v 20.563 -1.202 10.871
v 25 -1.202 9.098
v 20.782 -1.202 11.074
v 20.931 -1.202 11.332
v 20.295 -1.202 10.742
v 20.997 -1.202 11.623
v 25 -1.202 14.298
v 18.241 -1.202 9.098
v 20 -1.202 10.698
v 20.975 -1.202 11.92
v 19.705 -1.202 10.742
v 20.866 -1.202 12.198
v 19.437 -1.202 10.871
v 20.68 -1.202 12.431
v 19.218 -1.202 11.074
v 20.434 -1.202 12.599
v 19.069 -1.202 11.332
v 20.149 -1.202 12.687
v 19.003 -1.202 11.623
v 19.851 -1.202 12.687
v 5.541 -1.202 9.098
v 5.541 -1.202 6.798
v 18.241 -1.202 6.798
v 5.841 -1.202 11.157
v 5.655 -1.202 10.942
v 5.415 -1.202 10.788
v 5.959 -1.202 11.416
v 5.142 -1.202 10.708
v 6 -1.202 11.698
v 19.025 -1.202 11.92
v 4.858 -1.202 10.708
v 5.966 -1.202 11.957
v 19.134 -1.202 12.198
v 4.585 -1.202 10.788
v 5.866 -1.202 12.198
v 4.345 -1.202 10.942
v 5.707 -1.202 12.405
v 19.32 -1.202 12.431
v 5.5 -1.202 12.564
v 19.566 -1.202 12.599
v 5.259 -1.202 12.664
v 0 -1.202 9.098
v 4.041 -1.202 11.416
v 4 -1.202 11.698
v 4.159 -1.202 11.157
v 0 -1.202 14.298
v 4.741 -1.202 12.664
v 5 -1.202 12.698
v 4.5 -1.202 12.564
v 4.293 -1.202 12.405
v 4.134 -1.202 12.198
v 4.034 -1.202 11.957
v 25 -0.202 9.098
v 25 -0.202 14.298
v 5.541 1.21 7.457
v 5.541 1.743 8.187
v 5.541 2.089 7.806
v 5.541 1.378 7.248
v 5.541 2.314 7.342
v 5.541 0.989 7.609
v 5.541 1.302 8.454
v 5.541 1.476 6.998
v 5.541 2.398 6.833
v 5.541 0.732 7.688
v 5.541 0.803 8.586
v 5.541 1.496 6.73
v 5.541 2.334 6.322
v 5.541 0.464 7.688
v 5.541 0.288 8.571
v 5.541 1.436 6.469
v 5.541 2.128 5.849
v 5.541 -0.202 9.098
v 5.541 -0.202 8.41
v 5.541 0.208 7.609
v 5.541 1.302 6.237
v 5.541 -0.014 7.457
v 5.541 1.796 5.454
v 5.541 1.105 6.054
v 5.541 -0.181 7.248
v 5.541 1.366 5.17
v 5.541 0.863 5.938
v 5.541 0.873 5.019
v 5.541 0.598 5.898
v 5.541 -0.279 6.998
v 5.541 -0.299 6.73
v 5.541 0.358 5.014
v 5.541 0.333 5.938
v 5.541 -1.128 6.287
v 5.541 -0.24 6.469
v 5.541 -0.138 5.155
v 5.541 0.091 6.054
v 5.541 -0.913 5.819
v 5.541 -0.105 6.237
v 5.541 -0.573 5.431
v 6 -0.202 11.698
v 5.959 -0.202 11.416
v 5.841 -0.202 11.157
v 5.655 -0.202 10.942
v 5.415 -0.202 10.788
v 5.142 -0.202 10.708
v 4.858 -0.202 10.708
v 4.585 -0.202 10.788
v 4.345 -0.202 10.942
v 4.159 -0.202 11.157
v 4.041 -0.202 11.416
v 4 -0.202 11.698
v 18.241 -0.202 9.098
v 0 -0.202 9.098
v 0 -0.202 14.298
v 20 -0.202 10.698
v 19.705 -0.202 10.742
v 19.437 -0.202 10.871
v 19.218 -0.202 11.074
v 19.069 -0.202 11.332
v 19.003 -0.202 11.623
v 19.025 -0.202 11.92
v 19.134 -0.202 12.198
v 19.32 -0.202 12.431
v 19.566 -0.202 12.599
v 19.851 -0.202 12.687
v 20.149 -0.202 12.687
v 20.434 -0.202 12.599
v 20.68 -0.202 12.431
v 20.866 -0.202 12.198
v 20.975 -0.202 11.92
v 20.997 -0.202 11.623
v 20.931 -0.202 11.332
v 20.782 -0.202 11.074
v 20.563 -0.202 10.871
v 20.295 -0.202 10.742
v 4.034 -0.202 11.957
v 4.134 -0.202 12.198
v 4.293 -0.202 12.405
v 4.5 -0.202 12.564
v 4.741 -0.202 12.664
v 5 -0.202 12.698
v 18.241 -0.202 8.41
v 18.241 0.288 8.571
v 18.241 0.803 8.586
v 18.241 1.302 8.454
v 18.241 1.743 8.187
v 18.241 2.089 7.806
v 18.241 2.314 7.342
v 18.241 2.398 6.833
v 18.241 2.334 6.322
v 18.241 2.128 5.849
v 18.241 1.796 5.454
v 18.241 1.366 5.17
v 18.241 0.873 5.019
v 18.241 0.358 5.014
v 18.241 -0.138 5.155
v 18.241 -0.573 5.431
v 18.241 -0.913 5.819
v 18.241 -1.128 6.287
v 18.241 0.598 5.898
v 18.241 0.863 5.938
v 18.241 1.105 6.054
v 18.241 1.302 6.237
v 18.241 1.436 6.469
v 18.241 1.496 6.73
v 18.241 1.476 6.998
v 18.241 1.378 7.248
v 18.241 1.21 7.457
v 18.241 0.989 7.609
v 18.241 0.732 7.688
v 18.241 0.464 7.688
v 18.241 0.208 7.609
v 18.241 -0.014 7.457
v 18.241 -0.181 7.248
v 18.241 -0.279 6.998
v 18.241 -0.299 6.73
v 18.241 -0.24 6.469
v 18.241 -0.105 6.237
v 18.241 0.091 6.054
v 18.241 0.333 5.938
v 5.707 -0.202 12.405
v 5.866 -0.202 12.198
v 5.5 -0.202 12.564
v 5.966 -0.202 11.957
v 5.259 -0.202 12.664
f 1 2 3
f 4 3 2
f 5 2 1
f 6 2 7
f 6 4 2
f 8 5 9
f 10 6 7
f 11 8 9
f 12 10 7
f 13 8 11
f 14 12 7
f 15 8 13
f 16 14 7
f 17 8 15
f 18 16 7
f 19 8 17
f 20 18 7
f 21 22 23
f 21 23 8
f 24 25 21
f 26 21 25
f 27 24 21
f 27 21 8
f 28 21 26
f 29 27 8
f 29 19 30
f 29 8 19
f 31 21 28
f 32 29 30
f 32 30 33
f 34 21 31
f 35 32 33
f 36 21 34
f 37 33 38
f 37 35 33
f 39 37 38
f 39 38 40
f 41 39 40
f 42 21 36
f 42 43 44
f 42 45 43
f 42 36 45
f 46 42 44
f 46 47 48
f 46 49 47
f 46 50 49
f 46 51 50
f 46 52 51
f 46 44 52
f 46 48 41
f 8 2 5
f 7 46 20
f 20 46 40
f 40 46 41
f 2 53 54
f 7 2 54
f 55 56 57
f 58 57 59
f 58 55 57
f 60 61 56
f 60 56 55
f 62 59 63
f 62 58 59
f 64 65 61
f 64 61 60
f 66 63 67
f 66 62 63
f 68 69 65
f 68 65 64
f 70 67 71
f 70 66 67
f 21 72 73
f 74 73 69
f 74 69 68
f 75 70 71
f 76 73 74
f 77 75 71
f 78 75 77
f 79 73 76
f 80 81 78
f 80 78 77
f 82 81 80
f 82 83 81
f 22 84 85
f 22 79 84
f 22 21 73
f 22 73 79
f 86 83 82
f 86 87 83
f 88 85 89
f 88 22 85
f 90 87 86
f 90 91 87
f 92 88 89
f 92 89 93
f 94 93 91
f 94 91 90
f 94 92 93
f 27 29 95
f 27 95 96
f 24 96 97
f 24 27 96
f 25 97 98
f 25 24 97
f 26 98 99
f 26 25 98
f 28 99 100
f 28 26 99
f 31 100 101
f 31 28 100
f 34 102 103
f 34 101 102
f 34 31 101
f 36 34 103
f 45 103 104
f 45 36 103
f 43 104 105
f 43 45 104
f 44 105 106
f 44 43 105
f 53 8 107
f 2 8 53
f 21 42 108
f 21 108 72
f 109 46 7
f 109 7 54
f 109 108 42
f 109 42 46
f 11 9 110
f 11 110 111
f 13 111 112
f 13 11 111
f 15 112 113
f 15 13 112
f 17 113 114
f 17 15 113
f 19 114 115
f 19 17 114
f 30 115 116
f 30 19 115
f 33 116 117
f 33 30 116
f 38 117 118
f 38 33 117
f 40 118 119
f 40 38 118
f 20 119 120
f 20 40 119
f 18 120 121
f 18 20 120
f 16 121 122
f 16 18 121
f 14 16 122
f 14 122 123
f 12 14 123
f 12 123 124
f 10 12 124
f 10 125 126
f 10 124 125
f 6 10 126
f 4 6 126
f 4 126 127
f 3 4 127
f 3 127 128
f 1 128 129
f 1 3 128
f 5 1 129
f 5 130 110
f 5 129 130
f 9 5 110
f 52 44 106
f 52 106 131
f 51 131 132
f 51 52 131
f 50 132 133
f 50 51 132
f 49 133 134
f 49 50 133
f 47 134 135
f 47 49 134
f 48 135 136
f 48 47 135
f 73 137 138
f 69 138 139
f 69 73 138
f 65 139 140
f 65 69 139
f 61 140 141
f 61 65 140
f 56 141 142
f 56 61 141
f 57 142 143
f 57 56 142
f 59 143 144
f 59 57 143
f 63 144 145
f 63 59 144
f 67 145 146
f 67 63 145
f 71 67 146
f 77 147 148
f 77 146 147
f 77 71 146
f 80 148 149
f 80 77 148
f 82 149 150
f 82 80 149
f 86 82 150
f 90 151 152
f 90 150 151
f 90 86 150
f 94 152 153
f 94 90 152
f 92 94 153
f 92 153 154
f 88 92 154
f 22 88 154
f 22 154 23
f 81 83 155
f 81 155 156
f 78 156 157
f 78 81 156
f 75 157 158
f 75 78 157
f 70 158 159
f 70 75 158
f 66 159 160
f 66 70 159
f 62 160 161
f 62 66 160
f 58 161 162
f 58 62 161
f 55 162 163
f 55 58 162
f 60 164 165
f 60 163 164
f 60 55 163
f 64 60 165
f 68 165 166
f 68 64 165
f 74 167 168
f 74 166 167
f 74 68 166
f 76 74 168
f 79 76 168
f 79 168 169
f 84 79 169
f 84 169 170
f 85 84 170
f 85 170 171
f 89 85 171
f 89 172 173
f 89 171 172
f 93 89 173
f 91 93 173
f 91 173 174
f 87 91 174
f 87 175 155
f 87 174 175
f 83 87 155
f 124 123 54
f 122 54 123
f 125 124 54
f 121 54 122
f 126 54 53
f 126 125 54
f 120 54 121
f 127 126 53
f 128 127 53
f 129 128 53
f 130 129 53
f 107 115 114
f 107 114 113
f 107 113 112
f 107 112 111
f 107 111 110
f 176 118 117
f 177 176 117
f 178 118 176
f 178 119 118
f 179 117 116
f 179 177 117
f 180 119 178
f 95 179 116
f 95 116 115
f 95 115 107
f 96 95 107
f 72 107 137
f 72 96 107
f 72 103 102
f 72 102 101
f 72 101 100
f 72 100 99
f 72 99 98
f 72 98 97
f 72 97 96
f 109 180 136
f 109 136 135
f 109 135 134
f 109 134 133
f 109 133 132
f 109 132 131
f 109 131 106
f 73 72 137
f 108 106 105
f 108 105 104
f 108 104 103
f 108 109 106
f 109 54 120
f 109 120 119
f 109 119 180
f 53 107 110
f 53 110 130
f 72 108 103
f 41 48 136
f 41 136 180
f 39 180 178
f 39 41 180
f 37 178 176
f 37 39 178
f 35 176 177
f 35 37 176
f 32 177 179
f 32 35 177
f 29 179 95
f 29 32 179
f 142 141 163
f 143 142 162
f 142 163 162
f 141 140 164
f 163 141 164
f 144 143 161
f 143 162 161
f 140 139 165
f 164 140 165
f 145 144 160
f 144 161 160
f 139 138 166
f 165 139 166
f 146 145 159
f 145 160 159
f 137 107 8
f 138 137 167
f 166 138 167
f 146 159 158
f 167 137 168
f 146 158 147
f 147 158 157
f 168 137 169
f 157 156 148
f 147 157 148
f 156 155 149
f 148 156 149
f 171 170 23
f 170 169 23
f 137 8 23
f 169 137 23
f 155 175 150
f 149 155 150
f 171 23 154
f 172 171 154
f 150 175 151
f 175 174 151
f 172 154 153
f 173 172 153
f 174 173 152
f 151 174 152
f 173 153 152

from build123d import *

# Parameters (mm, degrees)
SKETCH1_R               = 0.9
BOSS_EXTRUDE1_DEPTH     = 25
CUT_EXTRUDE1_DEPTH      = 25
CUT_EXTRUDE1_DEPTH_BACK = 25
SKETCH2_W               = 5.541335726
SKETCH2_H               = 4.1
SKETCH2_W_2             = 6.758664274
CUT_EXTRUDE2_DEPTH      = 25
CUT_EXTRUDE2_DEPTH_BACK = 25
SKETCH3_R               = 1


with BuildPart() as part:
    # Sketch1 → Boss-Extrude1 (new body)
    with BuildSketch(Plane(origin=(0, 0, 0), x_dir=(0, 0, -1), z_dir=(1, 0, 0))):
        with BuildLine():
            Line((-6.797691641, -1.201831935), (-14.297691641, -1.201831935))
            Line((-14.297691641, -1.201831935), (-14.297691641, -0.201831935))
            Line((-14.297691641, -0.201831935), (-8.410143191, -0.201831935))
            ThreePointArc((-8.410143191, -0.201831935), (-5.849008343, 2.127873919), (-6.797691641, -1.201831935))
        make_face()
        with Locations((-6.797691641, 0.598168065)):
            Circle(SKETCH1_R, mode=Mode.SUBTRACT)
    extrude(amount=BOSS_EXTRUDE1_DEPTH)

    # Sketch2 → Cut-Extrude1 (cut, two sides: drawn at the far end of the back side and taken through both)
    with BuildSketch(Plane(origin=(0, 0, 0), x_dir=(1, 0, 0), z_dir=(0, 1, 0)).offset(-CUT_EXTRUDE1_DEPTH_BACK)):
        with Locations((2.770667863, -7.047691641)):
            Rectangle(SKETCH2_W, SKETCH2_H)
        with Locations((21.620667863, -7.047691641)):
            Rectangle(SKETCH2_W_2, SKETCH2_H)
    extrude(amount=CUT_EXTRUDE1_DEPTH + CUT_EXTRUDE1_DEPTH_BACK, mode=Mode.SUBTRACT)

    # Sketch3 → Cut-Extrude2 (cut, two sides: drawn at the far end of the back side and taken through both)
    with BuildSketch(Plane(origin=(0, -0.201831935, 0), x_dir=(1, 0, 0), z_dir=(0, 1, 0)).offset(-CUT_EXTRUDE2_DEPTH_BACK)):
        with Locations((5, -11.697691641)):
            Circle(SKETCH3_R)
        with Locations((20, -11.697691641)):
            Circle(SKETCH3_R)
    extrude(amount=CUT_EXTRUDE2_DEPTH + CUT_EXTRUDE2_DEPTH_BACK, mode=Mode.SUBTRACT)


solid = part.part
